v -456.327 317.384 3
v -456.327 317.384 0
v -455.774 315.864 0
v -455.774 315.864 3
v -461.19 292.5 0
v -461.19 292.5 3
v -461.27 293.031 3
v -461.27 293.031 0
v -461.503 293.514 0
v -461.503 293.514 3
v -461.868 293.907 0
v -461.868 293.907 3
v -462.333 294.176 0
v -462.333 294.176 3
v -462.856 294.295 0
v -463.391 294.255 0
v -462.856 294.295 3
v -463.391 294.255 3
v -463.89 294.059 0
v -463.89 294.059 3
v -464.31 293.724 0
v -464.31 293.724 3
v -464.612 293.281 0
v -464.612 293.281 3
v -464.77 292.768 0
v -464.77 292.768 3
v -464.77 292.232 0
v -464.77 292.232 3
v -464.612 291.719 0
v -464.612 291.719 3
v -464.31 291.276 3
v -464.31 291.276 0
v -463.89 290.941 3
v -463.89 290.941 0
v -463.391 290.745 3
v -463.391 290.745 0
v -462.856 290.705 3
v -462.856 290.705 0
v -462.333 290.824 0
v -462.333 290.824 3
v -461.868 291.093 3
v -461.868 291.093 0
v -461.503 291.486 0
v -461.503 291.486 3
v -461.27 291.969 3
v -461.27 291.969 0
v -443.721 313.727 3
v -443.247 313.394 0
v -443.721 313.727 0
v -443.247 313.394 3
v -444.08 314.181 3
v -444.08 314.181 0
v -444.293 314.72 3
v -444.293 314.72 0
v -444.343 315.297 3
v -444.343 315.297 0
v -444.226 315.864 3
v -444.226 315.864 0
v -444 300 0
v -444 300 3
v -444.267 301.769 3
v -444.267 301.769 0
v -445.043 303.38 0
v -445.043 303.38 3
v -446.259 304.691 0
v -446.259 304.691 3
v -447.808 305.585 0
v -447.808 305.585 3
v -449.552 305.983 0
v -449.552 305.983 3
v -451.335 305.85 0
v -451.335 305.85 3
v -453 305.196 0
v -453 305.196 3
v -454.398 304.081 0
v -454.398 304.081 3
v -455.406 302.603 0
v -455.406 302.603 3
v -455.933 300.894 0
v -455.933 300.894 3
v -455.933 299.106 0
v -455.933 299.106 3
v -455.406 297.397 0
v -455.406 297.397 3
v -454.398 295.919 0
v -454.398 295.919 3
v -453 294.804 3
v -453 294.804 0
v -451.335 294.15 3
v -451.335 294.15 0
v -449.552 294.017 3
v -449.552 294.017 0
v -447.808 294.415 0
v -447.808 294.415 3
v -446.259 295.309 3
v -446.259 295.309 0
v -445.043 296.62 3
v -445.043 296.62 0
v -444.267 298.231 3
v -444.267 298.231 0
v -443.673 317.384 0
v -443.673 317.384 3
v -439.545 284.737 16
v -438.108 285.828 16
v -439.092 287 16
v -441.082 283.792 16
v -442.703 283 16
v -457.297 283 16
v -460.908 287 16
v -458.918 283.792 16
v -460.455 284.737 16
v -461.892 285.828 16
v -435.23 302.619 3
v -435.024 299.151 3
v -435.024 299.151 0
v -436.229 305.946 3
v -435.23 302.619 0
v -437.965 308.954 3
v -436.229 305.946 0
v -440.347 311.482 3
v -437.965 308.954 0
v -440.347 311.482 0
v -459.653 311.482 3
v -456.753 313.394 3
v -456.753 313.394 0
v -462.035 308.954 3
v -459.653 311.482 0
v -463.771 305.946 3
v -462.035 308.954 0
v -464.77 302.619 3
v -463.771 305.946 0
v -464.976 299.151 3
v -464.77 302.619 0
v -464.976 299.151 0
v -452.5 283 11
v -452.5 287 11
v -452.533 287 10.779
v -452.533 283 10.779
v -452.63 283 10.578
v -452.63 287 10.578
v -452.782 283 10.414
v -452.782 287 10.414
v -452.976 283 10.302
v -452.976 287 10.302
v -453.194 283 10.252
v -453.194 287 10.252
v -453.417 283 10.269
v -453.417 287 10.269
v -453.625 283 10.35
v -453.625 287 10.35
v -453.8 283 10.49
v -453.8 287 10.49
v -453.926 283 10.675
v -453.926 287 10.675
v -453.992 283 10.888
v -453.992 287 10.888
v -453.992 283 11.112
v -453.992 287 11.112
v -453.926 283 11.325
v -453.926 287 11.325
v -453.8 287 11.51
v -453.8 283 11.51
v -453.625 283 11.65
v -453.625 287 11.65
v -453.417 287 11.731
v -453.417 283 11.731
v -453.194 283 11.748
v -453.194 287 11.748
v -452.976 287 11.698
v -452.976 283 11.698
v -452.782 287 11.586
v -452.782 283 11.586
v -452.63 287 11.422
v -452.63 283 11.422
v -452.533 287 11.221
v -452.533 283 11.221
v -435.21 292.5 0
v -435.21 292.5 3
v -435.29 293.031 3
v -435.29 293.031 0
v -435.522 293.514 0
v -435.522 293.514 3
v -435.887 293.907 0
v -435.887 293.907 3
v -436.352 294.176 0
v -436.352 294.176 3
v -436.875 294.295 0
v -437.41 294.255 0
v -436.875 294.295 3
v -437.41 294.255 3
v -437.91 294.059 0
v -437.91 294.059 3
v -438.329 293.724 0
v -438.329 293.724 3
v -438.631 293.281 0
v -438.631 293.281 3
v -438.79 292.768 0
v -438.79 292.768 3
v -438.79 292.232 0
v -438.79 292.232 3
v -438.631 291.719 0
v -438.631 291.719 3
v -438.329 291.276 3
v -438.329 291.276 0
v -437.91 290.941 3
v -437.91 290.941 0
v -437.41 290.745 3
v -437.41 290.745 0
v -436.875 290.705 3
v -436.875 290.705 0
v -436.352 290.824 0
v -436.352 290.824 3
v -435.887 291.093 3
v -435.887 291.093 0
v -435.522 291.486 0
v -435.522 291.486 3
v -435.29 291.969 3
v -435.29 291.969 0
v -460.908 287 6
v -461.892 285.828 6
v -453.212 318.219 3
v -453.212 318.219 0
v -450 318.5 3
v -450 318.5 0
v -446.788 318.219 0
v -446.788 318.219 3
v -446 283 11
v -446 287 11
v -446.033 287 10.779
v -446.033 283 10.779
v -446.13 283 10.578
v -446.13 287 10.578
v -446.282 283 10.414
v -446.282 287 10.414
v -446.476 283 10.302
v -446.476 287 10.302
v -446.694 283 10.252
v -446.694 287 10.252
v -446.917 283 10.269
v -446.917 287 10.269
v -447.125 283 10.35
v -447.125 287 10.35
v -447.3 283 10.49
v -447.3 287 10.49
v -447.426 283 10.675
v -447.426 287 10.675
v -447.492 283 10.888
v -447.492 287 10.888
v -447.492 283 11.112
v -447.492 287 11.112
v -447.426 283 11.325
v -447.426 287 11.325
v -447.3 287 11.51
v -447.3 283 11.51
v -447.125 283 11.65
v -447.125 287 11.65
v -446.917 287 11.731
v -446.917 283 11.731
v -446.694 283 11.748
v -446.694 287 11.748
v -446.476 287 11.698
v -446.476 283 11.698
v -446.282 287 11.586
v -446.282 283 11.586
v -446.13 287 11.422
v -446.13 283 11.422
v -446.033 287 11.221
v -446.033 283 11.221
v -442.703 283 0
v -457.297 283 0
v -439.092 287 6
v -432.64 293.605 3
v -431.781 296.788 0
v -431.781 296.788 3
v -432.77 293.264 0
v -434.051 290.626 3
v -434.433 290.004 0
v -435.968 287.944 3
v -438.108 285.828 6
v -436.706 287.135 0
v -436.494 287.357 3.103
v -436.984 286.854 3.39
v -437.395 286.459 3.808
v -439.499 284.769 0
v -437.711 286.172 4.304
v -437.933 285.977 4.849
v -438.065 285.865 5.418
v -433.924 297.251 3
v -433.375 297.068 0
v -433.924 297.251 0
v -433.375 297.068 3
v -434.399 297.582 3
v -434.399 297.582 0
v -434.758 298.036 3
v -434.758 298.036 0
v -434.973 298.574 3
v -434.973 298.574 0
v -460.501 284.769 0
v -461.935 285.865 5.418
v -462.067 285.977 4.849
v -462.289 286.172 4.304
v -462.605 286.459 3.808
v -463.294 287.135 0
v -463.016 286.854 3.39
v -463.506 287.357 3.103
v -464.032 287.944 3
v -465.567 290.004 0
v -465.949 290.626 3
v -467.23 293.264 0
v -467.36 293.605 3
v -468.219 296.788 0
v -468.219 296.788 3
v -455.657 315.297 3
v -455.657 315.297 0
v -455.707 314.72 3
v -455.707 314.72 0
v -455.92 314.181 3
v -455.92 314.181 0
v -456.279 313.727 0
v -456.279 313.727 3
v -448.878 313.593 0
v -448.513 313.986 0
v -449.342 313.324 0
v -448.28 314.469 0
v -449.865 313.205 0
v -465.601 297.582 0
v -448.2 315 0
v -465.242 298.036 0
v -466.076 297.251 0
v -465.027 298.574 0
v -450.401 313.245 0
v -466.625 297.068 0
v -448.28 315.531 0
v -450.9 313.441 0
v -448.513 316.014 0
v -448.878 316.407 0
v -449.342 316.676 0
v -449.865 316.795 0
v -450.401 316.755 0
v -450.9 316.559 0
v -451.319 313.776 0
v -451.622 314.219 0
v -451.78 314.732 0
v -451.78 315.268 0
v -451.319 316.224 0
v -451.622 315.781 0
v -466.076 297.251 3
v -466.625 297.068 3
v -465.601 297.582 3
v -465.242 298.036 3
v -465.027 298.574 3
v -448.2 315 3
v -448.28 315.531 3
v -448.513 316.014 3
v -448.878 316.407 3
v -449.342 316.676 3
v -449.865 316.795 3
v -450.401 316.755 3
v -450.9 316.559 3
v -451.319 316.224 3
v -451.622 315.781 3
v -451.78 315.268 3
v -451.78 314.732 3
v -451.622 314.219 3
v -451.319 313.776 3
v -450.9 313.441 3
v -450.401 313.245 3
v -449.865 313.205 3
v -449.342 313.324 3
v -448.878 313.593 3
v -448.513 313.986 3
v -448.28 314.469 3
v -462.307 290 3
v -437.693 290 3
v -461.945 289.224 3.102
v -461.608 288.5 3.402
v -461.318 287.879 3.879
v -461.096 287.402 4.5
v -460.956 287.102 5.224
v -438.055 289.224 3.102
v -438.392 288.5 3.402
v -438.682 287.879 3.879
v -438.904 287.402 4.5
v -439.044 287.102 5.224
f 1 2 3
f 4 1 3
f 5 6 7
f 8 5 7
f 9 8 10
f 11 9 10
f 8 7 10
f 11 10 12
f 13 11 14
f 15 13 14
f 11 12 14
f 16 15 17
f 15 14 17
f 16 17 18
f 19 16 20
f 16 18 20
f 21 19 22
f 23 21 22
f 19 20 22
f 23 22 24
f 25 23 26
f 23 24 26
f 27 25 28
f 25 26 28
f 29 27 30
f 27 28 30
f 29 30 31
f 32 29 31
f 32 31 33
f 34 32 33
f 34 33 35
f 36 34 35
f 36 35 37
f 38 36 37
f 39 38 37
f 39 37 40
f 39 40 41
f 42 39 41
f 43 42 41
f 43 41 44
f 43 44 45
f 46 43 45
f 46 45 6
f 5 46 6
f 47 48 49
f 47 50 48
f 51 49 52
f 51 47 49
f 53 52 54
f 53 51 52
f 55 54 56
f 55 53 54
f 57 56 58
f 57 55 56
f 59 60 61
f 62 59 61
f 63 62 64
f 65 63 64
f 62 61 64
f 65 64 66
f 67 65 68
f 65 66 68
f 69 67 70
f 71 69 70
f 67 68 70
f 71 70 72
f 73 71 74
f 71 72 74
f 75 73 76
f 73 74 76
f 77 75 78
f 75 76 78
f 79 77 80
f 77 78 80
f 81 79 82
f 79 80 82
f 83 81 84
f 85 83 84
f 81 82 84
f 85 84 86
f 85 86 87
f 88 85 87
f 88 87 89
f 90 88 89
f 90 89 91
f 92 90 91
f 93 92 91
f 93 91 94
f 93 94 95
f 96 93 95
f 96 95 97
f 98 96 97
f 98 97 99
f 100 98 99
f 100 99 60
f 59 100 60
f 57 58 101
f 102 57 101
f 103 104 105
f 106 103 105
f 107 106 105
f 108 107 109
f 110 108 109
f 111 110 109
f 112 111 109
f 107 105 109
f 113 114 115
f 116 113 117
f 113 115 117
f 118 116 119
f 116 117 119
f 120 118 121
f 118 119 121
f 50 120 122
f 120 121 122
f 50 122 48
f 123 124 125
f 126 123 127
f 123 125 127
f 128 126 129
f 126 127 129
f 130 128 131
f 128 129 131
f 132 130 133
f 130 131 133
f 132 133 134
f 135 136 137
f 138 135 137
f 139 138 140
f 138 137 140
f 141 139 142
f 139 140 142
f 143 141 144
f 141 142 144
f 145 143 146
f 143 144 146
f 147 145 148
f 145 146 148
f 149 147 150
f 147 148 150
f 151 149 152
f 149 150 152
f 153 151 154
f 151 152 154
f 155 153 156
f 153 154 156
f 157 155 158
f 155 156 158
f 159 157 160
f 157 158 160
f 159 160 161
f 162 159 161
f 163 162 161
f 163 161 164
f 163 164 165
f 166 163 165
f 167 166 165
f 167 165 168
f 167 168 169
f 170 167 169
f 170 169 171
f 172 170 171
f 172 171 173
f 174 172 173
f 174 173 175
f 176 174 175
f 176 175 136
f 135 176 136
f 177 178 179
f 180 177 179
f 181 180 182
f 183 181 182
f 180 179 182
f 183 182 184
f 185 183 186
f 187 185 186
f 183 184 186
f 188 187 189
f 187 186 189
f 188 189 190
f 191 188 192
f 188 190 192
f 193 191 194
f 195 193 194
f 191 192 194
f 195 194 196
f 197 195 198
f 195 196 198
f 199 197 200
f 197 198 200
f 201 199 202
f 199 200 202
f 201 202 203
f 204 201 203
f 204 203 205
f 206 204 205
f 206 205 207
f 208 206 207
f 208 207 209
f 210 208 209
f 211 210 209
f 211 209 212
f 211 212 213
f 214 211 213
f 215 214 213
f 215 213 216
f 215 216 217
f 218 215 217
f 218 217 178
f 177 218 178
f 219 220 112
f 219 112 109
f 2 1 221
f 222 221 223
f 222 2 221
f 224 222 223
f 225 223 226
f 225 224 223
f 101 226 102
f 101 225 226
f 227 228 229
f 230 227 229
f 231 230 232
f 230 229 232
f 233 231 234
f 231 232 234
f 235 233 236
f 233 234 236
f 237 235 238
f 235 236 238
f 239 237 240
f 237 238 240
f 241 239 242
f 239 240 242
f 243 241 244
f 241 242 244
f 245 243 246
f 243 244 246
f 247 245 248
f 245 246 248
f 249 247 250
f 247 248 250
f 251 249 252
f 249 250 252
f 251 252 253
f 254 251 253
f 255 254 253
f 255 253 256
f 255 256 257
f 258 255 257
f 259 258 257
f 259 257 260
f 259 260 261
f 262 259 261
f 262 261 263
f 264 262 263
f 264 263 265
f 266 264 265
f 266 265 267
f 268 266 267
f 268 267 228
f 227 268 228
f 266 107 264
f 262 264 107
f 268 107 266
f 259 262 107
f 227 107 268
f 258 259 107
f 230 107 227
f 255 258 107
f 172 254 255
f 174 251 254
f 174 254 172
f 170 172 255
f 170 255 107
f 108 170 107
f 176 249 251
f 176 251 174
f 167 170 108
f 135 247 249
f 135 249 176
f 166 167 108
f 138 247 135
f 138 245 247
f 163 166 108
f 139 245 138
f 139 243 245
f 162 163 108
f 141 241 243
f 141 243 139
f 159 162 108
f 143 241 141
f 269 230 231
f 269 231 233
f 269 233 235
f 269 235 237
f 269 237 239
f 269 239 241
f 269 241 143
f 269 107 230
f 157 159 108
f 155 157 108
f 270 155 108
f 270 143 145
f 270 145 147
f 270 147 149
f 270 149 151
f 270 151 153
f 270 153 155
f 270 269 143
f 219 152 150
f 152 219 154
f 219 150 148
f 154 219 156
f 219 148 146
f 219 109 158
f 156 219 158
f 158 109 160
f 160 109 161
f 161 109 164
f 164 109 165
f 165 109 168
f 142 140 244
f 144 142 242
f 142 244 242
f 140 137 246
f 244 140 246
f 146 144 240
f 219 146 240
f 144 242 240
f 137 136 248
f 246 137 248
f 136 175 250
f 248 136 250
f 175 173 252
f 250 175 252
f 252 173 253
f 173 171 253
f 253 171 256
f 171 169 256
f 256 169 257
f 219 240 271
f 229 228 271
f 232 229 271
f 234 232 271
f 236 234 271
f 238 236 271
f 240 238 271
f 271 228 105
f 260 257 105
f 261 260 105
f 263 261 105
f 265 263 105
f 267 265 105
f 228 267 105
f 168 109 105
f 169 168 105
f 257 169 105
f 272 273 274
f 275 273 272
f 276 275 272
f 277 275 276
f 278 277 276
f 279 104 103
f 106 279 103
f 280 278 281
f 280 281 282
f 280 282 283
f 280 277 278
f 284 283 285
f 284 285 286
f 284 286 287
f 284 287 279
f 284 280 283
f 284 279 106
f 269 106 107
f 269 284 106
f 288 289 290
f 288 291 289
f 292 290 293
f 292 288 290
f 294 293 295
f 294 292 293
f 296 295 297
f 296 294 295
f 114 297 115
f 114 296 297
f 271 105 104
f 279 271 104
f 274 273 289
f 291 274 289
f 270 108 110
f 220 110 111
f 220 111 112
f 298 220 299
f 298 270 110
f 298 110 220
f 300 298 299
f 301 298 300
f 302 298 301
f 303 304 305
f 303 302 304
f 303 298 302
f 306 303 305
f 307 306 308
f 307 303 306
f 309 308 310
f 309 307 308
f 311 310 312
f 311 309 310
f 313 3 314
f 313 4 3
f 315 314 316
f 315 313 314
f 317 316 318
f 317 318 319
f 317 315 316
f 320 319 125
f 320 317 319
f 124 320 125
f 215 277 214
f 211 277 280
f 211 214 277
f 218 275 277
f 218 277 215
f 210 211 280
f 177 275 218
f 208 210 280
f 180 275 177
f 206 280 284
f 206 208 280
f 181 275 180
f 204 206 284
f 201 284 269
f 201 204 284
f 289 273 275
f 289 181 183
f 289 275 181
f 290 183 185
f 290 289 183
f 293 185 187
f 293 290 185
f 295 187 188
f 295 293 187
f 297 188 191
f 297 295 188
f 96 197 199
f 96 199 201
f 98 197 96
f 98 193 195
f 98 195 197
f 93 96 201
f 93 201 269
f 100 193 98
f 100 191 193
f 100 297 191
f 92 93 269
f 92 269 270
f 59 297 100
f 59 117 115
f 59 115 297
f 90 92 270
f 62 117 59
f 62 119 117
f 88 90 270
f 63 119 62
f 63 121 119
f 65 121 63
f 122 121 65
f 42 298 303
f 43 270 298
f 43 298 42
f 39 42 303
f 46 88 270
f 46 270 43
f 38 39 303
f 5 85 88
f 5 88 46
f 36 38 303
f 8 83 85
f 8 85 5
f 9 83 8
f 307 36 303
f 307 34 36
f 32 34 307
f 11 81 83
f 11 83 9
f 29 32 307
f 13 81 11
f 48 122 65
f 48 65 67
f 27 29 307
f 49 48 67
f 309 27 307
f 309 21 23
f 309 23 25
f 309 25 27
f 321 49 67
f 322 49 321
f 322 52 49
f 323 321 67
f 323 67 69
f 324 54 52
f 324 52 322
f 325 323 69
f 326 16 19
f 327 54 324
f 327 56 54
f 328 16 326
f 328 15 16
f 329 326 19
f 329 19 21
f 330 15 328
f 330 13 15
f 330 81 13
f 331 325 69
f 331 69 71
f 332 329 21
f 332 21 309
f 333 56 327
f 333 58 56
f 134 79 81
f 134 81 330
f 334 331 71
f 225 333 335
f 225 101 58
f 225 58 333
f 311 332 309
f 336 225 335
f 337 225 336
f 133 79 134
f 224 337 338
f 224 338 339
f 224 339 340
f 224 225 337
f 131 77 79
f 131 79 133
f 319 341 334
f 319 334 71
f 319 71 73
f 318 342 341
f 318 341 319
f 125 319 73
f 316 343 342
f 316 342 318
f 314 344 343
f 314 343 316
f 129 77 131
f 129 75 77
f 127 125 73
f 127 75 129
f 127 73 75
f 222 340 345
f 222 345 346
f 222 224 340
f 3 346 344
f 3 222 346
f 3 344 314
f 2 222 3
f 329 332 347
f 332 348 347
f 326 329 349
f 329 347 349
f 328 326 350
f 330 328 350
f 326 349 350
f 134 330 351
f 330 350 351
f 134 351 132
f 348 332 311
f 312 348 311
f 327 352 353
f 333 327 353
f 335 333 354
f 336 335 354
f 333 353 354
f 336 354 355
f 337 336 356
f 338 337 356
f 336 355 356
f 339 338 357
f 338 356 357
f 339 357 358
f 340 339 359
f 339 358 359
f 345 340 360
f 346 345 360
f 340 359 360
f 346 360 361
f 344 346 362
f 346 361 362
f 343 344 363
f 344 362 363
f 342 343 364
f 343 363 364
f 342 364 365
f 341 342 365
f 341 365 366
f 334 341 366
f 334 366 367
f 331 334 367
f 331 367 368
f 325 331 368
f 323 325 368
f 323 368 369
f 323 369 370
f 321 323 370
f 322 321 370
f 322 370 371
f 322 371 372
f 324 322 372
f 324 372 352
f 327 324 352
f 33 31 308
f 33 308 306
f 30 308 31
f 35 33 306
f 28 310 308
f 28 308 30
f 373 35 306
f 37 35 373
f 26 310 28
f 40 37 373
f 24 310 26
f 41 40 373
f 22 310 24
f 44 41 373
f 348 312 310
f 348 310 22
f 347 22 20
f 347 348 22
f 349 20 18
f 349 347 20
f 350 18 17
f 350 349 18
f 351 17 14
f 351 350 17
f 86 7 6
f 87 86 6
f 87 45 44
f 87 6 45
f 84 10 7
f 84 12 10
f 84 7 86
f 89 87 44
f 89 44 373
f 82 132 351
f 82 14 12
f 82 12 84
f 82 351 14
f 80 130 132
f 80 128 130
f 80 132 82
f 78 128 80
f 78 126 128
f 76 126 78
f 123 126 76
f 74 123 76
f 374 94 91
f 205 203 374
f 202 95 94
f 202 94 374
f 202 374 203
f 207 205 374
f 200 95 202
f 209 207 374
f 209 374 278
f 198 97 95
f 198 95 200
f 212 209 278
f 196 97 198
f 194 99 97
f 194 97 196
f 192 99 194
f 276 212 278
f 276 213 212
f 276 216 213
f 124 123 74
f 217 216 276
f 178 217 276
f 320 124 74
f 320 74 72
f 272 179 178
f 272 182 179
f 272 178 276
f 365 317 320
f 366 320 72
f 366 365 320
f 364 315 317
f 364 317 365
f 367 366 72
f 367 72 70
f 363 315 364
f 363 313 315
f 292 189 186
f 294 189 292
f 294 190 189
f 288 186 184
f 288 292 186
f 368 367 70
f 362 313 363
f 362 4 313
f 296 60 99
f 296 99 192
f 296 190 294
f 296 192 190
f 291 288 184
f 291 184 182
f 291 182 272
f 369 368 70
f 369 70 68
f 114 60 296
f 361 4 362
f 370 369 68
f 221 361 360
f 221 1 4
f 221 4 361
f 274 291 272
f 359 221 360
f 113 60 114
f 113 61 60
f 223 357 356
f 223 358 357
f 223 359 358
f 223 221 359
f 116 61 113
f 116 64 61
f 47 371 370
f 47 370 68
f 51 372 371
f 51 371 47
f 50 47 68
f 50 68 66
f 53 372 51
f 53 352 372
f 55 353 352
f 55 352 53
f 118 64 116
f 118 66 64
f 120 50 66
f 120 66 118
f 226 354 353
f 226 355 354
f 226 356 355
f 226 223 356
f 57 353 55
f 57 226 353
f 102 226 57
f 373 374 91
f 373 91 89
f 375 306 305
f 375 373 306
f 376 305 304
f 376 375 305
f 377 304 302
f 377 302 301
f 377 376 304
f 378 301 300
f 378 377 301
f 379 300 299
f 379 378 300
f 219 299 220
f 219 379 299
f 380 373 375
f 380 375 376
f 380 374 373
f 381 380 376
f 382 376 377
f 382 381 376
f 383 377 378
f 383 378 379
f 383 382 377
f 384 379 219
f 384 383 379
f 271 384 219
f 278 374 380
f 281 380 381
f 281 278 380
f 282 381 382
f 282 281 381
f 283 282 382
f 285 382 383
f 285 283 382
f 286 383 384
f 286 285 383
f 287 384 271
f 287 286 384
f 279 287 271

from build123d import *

# Parameters (mm, degrees)
EXTRUDE_1_DEPTH             = 16
CUT_EXTRUDE_1_DEPTH         = 13
CUT_EXTRUDE_2_DEPTH         = 17
CUT_EXTRUDE_3_DEPTH         = 17
HOLE_WIZARD_1_5_1_5_1_D     = 1.5
HOLE_WIZARD_1_5_1_5_1_DEPTH = 35.5
HOLE_WIZARD_12_0_12_1_D     = 12
HOLE_WIZARD_12_0_12_1_DEPTH = 16
HOLE_WIZARD_3_6_3_6_1_D     = 3.6
HOLE_WIZARD_3_6_3_6_1_DEPTH = 16
FILLET_1_R                  = 2
FILLET_2_R                  = 3


with BuildPart() as part:
    # 草图1 → 凸台-拉伸1 (new body)
    with BuildSketch(Plane(origin=(0, 0, 0), x_dir=(-1, 0, 0), z_dir=(0, 0, -1))):
        with BuildLine():
            Line((442.70274024, 283), (457.29725976, 283))
            ThreePointArc((457.29725976, 283), (450, 318.5), (442.70274024, 283))
        make_face()
    extrude(amount=-EXTRUDE_1_DEPTH)

    # 草图2 → 切除-拉伸1 (cut)
    with BuildSketch(Plane.XY.offset(16)):
        with BuildLine():
            Line((-461.891570779, 285.828177802), (-460.908295205, 287))
            Line((-460.908295205, 287), (-439.091704795, 287))
            Line((-439.091704795, 287), (-438.108429221, 285.828177802))
            ThreePointArc((-438.108429221, 285.828177802), (-450, 318.5), (-461.891570779, 285.828177802))
        make_face()
    extrude(amount=-CUT_EXTRUDE_1_DEPTH, mode=Mode.SUBTRACT)

    # 草图3 → 切除-拉伸2 (cut, through all)
    with BuildSketch(Plane(origin=(0, 0, 0), x_dir=(-1, 0, 0), z_dir=(0, 0, -1))):
        with BuildLine():
            Line((431.781056569, 296.787508713), (435.227883705, 297.395277335))
            ThreePointArc((435.227883705, 297.395277335), (437.009618943, 307.5), (444.86969785, 314.095389312))
            Line((444.86969785, 314.095389312), (443.672627348, 317.384313485))
            ThreePointArc((443.672627348, 317.384313485), (433.97853003, 309.25), (431.781056569, 296.787508713))
        make_face()
    extrude(amount=-CUT_EXTRUDE_2_DEPTH, mode=Mode.SUBTRACT)

    # 草图4 → 切除-拉伸3 (cut, through all)
    with BuildSketch(Plane(origin=(0, 0, 0), x_dir=(-1, 0, 0), z_dir=(0, 0, -1))):
        with BuildLine():
            Line((456.327372652, 317.384313485), (455.13030215, 314.095389312))
            ThreePointArc((455.13030215, 314.095389312), (462.990381057, 307.5), (464.772116295, 297.395277335))
            Line((464.772116295, 297.395277335), (468.218943431, 296.787508713))
            ThreePointArc((468.218943431, 296.787508713), (466.02146997, 309.25), (456.327372652, 317.384313485))
        make_face()
    extrude(amount=-CUT_EXTRUDE_3_DEPTH, mode=Mode.SUBTRACT)

    # Ø1.5 (1.5) 直径孔1
    with Locations(Plane(origin=(0, 283, 0), x_dir=(-1, 0, 0), z_dir=(0, -1, 0))):
        with Locations((446.75, -11), (453.25, -11)):
            Hole(HOLE_WIZARD_1_5_1_5_1_D / 2, depth=HOLE_WIZARD_1_5_1_5_1_DEPTH)

    # Ø12.0 (12) 直径孔1
    with Locations(Plane(origin=(0, 0, 0), x_dir=(-1, 0, 0), z_dir=(0, 0, -1))):
        with Locations((450, 300)):
            Hole(HOLE_WIZARD_12_0_12_1_D / 2, depth=HOLE_WIZARD_12_0_12_1_DEPTH)

    # Ø3.6 (3.6) 直径孔1
    with Locations(Plane(origin=(0, 0, 0), x_dir=(-1, 0, 0), z_dir=(0, 0, -1))):
        with Locations((437.009618943, 292.5), (450, 315), (462.990381057, 292.5)):
            Hole(HOLE_WIZARD_3_6_3_6_1_D / 2, depth=HOLE_WIZARD_3_6_3_6_1_DEPTH)

    # 圆角1
    fillet_1_edges = [part.edges().sort_by_distance(p)[0] for p in [
        (-444.86969785, 314.095389312, 1.5),
        (-435.227883705, 297.395277335, 1.5),
        (-464.772116295, 297.395277335, 1.5),
        (-455.13030215, 314.095389312, 1.5),
    ]]
    fillet(fillet_1_edges, radius=FILLET_1_R)

    # 圆角2
    fillet_2_edges = [part.edges().sort_by_distance(p)[0] for p in [
        (-438.600067008, 286.414088901, 3),
        (-450, 287, 3),
        (-461.399932992, 286.414088901, 3),
    ]]
    fillet(fillet_2_edges, radius=FILLET_2_R)


solid = part.part
